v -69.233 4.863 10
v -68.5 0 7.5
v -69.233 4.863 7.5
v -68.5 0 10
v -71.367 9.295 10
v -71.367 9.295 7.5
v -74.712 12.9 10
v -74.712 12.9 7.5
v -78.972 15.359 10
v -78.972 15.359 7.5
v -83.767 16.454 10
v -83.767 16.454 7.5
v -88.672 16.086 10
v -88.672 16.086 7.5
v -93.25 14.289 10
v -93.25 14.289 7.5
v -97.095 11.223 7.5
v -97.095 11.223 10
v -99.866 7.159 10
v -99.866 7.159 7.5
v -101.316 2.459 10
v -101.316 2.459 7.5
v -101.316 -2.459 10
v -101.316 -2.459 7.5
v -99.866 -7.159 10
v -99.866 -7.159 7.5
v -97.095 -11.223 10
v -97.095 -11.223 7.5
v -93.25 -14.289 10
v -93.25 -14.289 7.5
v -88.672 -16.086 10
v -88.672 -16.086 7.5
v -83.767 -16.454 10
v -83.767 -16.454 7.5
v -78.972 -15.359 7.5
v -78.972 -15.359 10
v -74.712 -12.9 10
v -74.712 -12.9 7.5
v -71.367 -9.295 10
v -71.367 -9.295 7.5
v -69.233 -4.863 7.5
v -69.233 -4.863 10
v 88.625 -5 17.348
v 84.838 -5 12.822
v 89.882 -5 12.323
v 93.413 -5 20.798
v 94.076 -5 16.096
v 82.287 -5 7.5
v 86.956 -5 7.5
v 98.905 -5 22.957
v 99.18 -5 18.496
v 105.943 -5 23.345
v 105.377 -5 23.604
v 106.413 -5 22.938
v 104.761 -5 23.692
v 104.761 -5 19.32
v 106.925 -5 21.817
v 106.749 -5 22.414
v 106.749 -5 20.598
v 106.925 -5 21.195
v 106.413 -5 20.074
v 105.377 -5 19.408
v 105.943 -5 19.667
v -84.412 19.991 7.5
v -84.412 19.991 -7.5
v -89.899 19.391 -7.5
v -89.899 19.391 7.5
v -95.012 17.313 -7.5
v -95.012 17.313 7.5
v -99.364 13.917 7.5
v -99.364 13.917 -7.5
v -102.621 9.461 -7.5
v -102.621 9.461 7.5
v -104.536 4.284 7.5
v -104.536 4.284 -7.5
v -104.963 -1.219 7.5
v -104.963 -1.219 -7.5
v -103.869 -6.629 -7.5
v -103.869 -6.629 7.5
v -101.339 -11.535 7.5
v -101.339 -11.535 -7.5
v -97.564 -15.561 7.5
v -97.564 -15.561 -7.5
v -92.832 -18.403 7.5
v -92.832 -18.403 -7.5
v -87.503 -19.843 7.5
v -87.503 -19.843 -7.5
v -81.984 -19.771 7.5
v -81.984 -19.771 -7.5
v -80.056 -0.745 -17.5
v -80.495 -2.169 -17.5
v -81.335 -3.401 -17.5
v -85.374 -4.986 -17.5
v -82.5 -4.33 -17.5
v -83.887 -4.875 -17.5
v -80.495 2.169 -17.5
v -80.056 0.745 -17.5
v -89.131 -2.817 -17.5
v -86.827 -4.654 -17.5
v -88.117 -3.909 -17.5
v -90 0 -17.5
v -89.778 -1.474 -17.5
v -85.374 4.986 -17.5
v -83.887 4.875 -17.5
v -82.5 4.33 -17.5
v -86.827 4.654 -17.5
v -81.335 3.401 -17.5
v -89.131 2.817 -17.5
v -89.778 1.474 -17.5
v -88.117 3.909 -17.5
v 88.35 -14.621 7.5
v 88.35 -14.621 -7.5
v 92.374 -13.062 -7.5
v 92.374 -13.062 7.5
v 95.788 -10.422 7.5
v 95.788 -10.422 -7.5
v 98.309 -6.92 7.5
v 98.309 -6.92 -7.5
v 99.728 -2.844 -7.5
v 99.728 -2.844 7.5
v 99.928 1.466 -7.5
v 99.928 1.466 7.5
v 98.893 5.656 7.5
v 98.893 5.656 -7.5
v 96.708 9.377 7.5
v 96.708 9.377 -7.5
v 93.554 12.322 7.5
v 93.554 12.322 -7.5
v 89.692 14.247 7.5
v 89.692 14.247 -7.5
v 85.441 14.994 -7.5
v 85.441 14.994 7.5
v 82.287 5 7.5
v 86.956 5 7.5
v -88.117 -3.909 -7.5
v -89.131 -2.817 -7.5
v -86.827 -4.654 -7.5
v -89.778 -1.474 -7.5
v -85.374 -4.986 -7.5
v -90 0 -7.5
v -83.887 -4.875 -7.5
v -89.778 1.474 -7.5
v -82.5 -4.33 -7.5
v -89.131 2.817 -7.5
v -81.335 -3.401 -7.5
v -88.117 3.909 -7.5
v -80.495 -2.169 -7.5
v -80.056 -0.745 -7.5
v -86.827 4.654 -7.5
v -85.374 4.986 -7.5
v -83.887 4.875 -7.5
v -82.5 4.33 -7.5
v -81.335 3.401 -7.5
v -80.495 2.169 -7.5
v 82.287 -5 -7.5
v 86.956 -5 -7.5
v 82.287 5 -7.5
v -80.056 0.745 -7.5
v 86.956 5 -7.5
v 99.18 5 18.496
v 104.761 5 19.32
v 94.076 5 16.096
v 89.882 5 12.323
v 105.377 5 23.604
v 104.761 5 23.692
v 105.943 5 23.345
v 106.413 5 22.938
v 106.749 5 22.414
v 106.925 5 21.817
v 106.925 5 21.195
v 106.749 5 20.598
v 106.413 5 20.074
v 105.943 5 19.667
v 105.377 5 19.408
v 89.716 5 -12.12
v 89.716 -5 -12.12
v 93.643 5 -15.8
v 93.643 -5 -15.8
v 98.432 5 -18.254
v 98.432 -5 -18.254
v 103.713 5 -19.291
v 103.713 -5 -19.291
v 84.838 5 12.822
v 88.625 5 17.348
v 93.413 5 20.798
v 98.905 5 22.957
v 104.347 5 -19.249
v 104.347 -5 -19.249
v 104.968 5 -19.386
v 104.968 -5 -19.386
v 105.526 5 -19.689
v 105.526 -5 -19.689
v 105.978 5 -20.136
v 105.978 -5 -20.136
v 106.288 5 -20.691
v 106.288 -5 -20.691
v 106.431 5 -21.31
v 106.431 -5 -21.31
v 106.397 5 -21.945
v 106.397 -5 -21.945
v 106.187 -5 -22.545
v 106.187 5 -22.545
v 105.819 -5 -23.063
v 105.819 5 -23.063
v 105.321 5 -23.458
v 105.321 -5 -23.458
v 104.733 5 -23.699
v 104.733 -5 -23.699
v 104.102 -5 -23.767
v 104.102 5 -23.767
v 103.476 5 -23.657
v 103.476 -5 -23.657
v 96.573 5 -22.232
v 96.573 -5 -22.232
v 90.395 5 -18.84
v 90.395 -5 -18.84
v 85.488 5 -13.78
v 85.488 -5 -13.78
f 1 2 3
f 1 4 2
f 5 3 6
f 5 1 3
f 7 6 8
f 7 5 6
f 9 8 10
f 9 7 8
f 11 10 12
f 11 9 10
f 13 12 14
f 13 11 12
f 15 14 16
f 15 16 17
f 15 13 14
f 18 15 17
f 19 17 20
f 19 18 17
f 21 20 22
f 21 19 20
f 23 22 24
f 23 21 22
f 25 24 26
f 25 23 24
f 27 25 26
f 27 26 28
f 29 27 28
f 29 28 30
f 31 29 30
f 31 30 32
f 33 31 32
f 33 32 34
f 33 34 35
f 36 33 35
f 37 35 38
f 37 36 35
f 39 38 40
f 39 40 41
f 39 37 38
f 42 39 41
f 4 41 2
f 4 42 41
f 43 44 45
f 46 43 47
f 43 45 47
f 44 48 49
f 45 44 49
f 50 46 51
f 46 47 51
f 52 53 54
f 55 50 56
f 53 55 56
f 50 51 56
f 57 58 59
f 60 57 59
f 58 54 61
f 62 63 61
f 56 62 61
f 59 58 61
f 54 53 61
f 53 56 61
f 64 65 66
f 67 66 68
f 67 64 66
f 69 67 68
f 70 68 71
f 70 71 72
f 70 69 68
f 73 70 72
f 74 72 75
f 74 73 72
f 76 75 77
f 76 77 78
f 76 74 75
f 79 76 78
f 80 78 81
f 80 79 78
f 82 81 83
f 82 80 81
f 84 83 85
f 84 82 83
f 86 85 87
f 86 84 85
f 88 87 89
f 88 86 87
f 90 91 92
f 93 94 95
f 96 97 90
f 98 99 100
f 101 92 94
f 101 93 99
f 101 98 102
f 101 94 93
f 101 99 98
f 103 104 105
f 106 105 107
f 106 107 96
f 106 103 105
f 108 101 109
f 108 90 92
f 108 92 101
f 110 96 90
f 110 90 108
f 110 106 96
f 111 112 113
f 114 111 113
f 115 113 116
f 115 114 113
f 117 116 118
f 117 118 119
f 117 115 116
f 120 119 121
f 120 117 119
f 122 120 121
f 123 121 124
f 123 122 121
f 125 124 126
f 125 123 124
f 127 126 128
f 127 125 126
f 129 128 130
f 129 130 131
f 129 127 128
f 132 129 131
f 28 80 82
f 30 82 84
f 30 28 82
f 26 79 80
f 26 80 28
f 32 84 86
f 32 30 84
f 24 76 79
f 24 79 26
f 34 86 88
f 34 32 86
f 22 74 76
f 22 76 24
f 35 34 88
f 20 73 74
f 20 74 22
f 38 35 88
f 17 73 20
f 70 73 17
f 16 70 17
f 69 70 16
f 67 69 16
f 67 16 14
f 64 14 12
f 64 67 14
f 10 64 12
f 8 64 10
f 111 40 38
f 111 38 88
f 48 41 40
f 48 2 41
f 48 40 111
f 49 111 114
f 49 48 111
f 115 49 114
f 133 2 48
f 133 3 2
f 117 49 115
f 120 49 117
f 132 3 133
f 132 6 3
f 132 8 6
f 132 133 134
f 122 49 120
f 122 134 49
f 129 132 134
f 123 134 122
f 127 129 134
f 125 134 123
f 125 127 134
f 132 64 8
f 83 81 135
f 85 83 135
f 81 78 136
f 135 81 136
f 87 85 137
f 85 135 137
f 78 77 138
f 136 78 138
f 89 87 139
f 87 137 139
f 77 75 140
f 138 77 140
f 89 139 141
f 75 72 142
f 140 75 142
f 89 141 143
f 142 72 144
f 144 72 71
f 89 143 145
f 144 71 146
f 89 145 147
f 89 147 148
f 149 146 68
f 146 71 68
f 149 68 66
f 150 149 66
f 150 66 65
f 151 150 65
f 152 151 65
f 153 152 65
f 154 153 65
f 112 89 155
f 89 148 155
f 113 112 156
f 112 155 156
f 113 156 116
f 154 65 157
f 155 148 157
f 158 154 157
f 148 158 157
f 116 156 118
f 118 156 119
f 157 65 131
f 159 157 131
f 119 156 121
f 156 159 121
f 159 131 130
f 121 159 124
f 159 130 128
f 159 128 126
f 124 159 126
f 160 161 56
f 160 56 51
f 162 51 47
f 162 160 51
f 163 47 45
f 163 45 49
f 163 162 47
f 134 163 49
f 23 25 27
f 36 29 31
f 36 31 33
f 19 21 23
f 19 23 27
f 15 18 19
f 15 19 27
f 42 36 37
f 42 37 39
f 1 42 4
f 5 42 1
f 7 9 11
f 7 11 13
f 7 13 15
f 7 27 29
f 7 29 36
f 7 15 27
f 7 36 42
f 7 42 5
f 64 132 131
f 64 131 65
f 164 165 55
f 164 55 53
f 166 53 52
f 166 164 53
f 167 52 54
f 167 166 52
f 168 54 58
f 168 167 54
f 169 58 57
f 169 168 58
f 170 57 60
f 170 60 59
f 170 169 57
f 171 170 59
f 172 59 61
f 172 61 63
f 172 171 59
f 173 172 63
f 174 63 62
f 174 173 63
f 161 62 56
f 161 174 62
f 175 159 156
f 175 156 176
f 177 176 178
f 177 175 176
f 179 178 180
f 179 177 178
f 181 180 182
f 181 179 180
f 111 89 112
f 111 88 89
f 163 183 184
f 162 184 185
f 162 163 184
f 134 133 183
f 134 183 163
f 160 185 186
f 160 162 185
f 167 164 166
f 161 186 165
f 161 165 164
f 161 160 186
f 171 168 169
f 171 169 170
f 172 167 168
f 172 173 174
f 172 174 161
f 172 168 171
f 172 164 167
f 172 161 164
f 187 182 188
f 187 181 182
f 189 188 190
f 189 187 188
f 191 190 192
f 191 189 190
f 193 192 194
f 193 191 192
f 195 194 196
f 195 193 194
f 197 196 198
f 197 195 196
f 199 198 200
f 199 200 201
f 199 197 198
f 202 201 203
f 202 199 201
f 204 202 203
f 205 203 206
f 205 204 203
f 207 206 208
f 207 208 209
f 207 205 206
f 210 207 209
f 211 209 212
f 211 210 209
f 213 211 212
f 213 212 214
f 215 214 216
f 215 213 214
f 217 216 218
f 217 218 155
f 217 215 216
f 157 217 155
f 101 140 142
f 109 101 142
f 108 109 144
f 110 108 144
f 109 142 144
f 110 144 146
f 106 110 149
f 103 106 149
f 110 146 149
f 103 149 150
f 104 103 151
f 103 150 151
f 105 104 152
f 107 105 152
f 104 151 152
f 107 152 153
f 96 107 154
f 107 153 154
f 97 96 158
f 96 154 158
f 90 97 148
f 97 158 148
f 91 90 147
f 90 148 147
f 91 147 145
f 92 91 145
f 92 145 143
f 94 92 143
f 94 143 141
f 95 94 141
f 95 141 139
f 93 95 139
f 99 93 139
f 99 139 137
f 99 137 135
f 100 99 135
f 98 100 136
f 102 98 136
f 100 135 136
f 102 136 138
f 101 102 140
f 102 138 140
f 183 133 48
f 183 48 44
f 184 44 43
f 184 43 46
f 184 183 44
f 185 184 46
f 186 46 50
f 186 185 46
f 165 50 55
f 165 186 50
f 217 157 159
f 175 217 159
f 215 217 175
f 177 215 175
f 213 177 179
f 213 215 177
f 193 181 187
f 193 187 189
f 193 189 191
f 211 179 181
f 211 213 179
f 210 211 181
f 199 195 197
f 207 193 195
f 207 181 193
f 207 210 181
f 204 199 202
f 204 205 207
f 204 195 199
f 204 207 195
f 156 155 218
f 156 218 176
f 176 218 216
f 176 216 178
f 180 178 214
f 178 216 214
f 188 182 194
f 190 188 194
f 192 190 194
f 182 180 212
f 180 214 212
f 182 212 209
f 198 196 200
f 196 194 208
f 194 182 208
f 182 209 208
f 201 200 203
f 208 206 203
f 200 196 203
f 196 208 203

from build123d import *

# Parameters (mm, degrees)
BOSS_EXTRUDE1_DEPTH = 7.5
SKETCH3_R           = 16.5
BOSS_EXTRUDE2_DEPTH = 2.5
SKETCH7_R           = 5
BOSS_EXTRUDE3_DEPTH = 10
BOSS_EXTRUDE4_DEPTH = 5


with BuildPart() as part:
    # Sketch1 → Boss-Extrude1 (new body, symmetric)
    with BuildSketch(Plane.XY):
        with BuildLine():
            Line((-81.983854392, -19.771263634), (88.350129521, -14.621102291))
            ThreePointArc((88.350129521, -14.621102291), (99.92815548, 1.466347152), (85.441176471, 14.993510707))
            Line((85.441176471, 14.993510707), (-84.411764706, 19.991347609))
            ThreePointArc((-84.411764706, 19.991347609), (-104.962820533, -1.218932468), (-81.983854392, -19.771263634))
        make_face()
    extrude(amount=BOSS_EXTRUDE1_DEPTH, both=True)

    # Sketch3 → Boss-Extrude2 (add, symmetric)
    with BuildSketch(Plane.XY.offset(7.5)):
        with Locations((-85, 0)):
            Circle(SKETCH3_R)
    extrude(amount=BOSS_EXTRUDE2_DEPTH, both=True)

    # Sketch7 → Boss-Extrude3 (add)
    with BuildSketch(Plane(origin=(0, 0, -7.5), x_dir=(-1, 0, 0), z_dir=(0, 0, -1))):
        with Locations((85, 0)):
            Circle(SKETCH7_R)
    extrude(amount=BOSS_EXTRUDE3_DEPTH)

    # Sketch12 → Boss-Extrude4 (add, symmetric)
    with BuildSketch(Plane(origin=(0, 0, 0), x_dir=(1, 0, 0), z_dir=(0, 1, 0))):
        with BuildLine():
            ThreePointArc((103.475564721, 23.657260108), (81.077385627, -0.642858818), (104.760808967, -23.692146559))
            ThreePointArc((104.760808967, -23.692146559), (106.947065998, -21.505889528), (104.760808967, -19.319632497))
            ThreePointArc((104.760808967, -19.319632497), (85.448289772, -0.524215738), (103.712763513, 19.291184529))
            ThreePointArc((103.712763513, 19.291184529), (106.436573923, 21.628643871), (103.475564721, 23.657260108))
        make_face()
    extrude(amount=BOSS_EXTRUDE4_DEPTH, both=True)


solid = part.part
